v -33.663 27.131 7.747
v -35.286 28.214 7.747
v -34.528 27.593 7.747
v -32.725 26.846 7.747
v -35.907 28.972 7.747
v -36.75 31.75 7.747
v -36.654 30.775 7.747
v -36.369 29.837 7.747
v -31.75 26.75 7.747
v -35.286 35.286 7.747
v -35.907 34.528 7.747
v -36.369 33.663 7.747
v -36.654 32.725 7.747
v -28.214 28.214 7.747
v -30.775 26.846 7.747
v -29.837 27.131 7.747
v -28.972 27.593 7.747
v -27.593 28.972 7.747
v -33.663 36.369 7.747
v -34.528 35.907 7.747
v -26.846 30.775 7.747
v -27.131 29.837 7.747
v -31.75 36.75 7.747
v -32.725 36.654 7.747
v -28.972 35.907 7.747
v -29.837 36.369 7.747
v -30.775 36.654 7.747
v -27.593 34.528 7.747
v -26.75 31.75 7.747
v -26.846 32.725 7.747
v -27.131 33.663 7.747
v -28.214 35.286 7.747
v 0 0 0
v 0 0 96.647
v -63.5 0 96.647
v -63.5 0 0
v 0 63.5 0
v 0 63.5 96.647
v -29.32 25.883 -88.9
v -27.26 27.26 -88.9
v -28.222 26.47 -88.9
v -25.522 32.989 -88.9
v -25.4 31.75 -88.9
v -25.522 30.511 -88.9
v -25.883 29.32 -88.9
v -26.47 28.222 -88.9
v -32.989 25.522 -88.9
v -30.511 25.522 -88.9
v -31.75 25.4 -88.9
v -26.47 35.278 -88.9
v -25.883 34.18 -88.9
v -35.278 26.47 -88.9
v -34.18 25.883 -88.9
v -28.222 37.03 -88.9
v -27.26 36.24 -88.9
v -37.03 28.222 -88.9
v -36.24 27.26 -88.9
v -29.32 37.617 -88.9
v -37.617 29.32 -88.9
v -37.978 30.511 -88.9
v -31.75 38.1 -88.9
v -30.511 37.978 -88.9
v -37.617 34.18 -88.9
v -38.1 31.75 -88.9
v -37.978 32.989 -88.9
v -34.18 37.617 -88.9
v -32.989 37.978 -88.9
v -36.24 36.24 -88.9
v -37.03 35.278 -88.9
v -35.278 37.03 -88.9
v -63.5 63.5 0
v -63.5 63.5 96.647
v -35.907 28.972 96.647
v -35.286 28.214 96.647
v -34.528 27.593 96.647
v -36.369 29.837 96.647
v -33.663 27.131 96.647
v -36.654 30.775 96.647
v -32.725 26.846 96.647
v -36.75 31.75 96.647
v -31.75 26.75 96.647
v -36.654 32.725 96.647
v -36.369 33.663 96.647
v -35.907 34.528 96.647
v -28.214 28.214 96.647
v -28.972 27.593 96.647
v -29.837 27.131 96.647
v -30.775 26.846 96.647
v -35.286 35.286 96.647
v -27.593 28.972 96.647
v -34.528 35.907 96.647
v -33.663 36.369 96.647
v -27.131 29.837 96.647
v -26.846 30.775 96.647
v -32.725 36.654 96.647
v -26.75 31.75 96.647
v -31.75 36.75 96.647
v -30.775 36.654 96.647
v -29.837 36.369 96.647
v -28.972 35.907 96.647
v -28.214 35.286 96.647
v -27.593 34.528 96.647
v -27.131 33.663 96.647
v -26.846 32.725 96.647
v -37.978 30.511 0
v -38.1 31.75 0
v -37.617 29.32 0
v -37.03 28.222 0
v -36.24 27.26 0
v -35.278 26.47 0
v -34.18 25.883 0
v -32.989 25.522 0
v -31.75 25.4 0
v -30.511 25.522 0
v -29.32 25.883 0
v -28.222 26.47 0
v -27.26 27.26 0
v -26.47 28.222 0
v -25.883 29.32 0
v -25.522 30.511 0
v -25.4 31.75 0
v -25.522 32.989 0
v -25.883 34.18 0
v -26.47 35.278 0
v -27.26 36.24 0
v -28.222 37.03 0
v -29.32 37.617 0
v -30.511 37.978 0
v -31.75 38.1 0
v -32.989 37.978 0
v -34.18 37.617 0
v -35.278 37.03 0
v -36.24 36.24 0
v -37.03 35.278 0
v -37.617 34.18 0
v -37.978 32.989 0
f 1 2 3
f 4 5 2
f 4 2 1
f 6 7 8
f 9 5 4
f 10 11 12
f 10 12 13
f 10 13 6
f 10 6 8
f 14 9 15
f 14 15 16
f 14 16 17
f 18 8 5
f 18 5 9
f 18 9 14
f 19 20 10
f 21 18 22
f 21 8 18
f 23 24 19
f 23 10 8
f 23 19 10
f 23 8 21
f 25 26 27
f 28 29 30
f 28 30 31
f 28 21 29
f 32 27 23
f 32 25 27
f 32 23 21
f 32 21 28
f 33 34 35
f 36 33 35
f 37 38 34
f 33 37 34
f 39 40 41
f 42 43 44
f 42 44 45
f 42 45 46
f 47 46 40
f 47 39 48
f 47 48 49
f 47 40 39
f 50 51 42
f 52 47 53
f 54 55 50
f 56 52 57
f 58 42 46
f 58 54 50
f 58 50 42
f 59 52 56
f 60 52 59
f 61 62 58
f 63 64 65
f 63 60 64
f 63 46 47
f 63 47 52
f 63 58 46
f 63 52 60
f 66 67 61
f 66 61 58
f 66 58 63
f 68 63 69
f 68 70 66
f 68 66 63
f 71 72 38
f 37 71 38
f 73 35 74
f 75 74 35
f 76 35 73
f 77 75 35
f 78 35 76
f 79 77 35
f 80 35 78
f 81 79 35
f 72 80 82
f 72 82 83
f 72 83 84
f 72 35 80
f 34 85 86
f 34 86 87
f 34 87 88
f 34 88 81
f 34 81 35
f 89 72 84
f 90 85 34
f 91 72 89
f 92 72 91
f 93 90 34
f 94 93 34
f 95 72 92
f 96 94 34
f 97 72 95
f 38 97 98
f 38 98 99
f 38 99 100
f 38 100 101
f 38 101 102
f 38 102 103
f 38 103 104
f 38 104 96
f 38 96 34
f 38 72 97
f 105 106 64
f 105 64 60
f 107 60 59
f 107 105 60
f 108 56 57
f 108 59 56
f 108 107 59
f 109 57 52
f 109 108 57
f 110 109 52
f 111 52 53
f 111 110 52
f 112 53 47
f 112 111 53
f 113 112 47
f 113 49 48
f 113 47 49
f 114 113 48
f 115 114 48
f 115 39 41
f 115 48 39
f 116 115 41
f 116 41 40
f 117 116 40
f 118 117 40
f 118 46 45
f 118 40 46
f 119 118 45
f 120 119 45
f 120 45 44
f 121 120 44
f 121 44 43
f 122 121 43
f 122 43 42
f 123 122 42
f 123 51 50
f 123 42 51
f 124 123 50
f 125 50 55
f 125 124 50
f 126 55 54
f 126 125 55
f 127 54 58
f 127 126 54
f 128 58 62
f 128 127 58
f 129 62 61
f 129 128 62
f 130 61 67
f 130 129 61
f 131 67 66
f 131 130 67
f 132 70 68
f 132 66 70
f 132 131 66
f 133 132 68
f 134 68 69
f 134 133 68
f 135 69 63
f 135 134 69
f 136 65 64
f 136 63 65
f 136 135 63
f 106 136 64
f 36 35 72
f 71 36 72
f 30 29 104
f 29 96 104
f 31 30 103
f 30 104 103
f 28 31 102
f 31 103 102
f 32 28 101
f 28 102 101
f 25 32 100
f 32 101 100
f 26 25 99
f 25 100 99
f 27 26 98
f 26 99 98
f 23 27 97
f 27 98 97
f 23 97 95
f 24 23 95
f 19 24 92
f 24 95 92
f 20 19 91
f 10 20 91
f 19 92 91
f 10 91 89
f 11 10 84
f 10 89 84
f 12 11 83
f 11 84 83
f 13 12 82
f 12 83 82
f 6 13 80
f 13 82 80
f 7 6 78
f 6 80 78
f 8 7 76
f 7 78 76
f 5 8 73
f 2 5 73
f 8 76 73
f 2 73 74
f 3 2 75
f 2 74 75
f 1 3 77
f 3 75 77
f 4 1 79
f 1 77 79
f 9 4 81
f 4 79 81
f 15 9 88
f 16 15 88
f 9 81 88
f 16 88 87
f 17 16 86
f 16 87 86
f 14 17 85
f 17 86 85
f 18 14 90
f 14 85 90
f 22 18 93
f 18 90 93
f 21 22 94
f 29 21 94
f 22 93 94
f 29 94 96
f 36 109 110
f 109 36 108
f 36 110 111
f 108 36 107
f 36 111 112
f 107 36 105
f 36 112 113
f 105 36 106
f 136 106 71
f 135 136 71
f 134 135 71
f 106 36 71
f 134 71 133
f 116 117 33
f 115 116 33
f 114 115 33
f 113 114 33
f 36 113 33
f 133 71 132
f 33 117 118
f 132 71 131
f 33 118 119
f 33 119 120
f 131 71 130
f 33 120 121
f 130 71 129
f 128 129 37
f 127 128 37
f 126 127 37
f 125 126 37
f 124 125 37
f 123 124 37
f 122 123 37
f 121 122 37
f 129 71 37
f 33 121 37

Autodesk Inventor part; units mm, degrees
ref_plane "YZ Plane" through (0, 0, 0) normal (1, 0, 0) x (0, 1, 0)
ref_plane "XZ Plane" through (0, 0, 0) normal (0, 1, 0) x (-1, 0, 0)
ref_plane "XY Plane" through (0, 0, 0) normal (0, 0, 1) x (1, 0, 0)
sketch "Sketch1" plane through (0, 0, 0) normal (0, 0, 1) x (1, 0, 0)
  line L0 (0, 0) -> (-63.5, 0)
  line L1 (-63.5, 0) -> (-63.5, 63.5)
  line L2 (-63.5, 63.5) -> (0, 63.5)
  line L3 (0, 63.5) -> (0, 0)
  dimension "d0" = 63.5
  dimension "d1" = 63.5
extrude "Extrusion1" add sketch "Sketch1" along normal blind 96.647
sketch "Sketch2" plane through (0, 0, 0) normal (0, 0, -1) x (-1, 0, 0)
  line L0 (0, 0) -> (63.5, 0) projected
  line L1 (0, 63.5) -> (0, 0) projected
  circle A0 centre (31.75, 31.75) radius 6.35
  dimension "d4" = 12.7
  dimension "d5" = 31.75
  dimension "d6" = 31.75
extrude "Extrusion2" add sketch "Sketch2" along normal blind 88.9
sketch "Sketch3" plane through (0, 0, 96.647) normal (0, 0, 1) x (1, 0, 0)
  line L0 (-63.5, 0) -> (0, 0) projected
  line L1 (0, 63.5) -> (-63.5, 63.5) projected
  line L2 (-31.75, 63.5) -> (-31.75, 0)
  circle A0 centre (-31.75, 31.75) radius 5
  dimension "d9" = 63.5
  dimension "d10" = 10
extrude "Extrusion3" cut sketch "Sketch3" against normal blind 88.9
properties part number "p80 space thing"
